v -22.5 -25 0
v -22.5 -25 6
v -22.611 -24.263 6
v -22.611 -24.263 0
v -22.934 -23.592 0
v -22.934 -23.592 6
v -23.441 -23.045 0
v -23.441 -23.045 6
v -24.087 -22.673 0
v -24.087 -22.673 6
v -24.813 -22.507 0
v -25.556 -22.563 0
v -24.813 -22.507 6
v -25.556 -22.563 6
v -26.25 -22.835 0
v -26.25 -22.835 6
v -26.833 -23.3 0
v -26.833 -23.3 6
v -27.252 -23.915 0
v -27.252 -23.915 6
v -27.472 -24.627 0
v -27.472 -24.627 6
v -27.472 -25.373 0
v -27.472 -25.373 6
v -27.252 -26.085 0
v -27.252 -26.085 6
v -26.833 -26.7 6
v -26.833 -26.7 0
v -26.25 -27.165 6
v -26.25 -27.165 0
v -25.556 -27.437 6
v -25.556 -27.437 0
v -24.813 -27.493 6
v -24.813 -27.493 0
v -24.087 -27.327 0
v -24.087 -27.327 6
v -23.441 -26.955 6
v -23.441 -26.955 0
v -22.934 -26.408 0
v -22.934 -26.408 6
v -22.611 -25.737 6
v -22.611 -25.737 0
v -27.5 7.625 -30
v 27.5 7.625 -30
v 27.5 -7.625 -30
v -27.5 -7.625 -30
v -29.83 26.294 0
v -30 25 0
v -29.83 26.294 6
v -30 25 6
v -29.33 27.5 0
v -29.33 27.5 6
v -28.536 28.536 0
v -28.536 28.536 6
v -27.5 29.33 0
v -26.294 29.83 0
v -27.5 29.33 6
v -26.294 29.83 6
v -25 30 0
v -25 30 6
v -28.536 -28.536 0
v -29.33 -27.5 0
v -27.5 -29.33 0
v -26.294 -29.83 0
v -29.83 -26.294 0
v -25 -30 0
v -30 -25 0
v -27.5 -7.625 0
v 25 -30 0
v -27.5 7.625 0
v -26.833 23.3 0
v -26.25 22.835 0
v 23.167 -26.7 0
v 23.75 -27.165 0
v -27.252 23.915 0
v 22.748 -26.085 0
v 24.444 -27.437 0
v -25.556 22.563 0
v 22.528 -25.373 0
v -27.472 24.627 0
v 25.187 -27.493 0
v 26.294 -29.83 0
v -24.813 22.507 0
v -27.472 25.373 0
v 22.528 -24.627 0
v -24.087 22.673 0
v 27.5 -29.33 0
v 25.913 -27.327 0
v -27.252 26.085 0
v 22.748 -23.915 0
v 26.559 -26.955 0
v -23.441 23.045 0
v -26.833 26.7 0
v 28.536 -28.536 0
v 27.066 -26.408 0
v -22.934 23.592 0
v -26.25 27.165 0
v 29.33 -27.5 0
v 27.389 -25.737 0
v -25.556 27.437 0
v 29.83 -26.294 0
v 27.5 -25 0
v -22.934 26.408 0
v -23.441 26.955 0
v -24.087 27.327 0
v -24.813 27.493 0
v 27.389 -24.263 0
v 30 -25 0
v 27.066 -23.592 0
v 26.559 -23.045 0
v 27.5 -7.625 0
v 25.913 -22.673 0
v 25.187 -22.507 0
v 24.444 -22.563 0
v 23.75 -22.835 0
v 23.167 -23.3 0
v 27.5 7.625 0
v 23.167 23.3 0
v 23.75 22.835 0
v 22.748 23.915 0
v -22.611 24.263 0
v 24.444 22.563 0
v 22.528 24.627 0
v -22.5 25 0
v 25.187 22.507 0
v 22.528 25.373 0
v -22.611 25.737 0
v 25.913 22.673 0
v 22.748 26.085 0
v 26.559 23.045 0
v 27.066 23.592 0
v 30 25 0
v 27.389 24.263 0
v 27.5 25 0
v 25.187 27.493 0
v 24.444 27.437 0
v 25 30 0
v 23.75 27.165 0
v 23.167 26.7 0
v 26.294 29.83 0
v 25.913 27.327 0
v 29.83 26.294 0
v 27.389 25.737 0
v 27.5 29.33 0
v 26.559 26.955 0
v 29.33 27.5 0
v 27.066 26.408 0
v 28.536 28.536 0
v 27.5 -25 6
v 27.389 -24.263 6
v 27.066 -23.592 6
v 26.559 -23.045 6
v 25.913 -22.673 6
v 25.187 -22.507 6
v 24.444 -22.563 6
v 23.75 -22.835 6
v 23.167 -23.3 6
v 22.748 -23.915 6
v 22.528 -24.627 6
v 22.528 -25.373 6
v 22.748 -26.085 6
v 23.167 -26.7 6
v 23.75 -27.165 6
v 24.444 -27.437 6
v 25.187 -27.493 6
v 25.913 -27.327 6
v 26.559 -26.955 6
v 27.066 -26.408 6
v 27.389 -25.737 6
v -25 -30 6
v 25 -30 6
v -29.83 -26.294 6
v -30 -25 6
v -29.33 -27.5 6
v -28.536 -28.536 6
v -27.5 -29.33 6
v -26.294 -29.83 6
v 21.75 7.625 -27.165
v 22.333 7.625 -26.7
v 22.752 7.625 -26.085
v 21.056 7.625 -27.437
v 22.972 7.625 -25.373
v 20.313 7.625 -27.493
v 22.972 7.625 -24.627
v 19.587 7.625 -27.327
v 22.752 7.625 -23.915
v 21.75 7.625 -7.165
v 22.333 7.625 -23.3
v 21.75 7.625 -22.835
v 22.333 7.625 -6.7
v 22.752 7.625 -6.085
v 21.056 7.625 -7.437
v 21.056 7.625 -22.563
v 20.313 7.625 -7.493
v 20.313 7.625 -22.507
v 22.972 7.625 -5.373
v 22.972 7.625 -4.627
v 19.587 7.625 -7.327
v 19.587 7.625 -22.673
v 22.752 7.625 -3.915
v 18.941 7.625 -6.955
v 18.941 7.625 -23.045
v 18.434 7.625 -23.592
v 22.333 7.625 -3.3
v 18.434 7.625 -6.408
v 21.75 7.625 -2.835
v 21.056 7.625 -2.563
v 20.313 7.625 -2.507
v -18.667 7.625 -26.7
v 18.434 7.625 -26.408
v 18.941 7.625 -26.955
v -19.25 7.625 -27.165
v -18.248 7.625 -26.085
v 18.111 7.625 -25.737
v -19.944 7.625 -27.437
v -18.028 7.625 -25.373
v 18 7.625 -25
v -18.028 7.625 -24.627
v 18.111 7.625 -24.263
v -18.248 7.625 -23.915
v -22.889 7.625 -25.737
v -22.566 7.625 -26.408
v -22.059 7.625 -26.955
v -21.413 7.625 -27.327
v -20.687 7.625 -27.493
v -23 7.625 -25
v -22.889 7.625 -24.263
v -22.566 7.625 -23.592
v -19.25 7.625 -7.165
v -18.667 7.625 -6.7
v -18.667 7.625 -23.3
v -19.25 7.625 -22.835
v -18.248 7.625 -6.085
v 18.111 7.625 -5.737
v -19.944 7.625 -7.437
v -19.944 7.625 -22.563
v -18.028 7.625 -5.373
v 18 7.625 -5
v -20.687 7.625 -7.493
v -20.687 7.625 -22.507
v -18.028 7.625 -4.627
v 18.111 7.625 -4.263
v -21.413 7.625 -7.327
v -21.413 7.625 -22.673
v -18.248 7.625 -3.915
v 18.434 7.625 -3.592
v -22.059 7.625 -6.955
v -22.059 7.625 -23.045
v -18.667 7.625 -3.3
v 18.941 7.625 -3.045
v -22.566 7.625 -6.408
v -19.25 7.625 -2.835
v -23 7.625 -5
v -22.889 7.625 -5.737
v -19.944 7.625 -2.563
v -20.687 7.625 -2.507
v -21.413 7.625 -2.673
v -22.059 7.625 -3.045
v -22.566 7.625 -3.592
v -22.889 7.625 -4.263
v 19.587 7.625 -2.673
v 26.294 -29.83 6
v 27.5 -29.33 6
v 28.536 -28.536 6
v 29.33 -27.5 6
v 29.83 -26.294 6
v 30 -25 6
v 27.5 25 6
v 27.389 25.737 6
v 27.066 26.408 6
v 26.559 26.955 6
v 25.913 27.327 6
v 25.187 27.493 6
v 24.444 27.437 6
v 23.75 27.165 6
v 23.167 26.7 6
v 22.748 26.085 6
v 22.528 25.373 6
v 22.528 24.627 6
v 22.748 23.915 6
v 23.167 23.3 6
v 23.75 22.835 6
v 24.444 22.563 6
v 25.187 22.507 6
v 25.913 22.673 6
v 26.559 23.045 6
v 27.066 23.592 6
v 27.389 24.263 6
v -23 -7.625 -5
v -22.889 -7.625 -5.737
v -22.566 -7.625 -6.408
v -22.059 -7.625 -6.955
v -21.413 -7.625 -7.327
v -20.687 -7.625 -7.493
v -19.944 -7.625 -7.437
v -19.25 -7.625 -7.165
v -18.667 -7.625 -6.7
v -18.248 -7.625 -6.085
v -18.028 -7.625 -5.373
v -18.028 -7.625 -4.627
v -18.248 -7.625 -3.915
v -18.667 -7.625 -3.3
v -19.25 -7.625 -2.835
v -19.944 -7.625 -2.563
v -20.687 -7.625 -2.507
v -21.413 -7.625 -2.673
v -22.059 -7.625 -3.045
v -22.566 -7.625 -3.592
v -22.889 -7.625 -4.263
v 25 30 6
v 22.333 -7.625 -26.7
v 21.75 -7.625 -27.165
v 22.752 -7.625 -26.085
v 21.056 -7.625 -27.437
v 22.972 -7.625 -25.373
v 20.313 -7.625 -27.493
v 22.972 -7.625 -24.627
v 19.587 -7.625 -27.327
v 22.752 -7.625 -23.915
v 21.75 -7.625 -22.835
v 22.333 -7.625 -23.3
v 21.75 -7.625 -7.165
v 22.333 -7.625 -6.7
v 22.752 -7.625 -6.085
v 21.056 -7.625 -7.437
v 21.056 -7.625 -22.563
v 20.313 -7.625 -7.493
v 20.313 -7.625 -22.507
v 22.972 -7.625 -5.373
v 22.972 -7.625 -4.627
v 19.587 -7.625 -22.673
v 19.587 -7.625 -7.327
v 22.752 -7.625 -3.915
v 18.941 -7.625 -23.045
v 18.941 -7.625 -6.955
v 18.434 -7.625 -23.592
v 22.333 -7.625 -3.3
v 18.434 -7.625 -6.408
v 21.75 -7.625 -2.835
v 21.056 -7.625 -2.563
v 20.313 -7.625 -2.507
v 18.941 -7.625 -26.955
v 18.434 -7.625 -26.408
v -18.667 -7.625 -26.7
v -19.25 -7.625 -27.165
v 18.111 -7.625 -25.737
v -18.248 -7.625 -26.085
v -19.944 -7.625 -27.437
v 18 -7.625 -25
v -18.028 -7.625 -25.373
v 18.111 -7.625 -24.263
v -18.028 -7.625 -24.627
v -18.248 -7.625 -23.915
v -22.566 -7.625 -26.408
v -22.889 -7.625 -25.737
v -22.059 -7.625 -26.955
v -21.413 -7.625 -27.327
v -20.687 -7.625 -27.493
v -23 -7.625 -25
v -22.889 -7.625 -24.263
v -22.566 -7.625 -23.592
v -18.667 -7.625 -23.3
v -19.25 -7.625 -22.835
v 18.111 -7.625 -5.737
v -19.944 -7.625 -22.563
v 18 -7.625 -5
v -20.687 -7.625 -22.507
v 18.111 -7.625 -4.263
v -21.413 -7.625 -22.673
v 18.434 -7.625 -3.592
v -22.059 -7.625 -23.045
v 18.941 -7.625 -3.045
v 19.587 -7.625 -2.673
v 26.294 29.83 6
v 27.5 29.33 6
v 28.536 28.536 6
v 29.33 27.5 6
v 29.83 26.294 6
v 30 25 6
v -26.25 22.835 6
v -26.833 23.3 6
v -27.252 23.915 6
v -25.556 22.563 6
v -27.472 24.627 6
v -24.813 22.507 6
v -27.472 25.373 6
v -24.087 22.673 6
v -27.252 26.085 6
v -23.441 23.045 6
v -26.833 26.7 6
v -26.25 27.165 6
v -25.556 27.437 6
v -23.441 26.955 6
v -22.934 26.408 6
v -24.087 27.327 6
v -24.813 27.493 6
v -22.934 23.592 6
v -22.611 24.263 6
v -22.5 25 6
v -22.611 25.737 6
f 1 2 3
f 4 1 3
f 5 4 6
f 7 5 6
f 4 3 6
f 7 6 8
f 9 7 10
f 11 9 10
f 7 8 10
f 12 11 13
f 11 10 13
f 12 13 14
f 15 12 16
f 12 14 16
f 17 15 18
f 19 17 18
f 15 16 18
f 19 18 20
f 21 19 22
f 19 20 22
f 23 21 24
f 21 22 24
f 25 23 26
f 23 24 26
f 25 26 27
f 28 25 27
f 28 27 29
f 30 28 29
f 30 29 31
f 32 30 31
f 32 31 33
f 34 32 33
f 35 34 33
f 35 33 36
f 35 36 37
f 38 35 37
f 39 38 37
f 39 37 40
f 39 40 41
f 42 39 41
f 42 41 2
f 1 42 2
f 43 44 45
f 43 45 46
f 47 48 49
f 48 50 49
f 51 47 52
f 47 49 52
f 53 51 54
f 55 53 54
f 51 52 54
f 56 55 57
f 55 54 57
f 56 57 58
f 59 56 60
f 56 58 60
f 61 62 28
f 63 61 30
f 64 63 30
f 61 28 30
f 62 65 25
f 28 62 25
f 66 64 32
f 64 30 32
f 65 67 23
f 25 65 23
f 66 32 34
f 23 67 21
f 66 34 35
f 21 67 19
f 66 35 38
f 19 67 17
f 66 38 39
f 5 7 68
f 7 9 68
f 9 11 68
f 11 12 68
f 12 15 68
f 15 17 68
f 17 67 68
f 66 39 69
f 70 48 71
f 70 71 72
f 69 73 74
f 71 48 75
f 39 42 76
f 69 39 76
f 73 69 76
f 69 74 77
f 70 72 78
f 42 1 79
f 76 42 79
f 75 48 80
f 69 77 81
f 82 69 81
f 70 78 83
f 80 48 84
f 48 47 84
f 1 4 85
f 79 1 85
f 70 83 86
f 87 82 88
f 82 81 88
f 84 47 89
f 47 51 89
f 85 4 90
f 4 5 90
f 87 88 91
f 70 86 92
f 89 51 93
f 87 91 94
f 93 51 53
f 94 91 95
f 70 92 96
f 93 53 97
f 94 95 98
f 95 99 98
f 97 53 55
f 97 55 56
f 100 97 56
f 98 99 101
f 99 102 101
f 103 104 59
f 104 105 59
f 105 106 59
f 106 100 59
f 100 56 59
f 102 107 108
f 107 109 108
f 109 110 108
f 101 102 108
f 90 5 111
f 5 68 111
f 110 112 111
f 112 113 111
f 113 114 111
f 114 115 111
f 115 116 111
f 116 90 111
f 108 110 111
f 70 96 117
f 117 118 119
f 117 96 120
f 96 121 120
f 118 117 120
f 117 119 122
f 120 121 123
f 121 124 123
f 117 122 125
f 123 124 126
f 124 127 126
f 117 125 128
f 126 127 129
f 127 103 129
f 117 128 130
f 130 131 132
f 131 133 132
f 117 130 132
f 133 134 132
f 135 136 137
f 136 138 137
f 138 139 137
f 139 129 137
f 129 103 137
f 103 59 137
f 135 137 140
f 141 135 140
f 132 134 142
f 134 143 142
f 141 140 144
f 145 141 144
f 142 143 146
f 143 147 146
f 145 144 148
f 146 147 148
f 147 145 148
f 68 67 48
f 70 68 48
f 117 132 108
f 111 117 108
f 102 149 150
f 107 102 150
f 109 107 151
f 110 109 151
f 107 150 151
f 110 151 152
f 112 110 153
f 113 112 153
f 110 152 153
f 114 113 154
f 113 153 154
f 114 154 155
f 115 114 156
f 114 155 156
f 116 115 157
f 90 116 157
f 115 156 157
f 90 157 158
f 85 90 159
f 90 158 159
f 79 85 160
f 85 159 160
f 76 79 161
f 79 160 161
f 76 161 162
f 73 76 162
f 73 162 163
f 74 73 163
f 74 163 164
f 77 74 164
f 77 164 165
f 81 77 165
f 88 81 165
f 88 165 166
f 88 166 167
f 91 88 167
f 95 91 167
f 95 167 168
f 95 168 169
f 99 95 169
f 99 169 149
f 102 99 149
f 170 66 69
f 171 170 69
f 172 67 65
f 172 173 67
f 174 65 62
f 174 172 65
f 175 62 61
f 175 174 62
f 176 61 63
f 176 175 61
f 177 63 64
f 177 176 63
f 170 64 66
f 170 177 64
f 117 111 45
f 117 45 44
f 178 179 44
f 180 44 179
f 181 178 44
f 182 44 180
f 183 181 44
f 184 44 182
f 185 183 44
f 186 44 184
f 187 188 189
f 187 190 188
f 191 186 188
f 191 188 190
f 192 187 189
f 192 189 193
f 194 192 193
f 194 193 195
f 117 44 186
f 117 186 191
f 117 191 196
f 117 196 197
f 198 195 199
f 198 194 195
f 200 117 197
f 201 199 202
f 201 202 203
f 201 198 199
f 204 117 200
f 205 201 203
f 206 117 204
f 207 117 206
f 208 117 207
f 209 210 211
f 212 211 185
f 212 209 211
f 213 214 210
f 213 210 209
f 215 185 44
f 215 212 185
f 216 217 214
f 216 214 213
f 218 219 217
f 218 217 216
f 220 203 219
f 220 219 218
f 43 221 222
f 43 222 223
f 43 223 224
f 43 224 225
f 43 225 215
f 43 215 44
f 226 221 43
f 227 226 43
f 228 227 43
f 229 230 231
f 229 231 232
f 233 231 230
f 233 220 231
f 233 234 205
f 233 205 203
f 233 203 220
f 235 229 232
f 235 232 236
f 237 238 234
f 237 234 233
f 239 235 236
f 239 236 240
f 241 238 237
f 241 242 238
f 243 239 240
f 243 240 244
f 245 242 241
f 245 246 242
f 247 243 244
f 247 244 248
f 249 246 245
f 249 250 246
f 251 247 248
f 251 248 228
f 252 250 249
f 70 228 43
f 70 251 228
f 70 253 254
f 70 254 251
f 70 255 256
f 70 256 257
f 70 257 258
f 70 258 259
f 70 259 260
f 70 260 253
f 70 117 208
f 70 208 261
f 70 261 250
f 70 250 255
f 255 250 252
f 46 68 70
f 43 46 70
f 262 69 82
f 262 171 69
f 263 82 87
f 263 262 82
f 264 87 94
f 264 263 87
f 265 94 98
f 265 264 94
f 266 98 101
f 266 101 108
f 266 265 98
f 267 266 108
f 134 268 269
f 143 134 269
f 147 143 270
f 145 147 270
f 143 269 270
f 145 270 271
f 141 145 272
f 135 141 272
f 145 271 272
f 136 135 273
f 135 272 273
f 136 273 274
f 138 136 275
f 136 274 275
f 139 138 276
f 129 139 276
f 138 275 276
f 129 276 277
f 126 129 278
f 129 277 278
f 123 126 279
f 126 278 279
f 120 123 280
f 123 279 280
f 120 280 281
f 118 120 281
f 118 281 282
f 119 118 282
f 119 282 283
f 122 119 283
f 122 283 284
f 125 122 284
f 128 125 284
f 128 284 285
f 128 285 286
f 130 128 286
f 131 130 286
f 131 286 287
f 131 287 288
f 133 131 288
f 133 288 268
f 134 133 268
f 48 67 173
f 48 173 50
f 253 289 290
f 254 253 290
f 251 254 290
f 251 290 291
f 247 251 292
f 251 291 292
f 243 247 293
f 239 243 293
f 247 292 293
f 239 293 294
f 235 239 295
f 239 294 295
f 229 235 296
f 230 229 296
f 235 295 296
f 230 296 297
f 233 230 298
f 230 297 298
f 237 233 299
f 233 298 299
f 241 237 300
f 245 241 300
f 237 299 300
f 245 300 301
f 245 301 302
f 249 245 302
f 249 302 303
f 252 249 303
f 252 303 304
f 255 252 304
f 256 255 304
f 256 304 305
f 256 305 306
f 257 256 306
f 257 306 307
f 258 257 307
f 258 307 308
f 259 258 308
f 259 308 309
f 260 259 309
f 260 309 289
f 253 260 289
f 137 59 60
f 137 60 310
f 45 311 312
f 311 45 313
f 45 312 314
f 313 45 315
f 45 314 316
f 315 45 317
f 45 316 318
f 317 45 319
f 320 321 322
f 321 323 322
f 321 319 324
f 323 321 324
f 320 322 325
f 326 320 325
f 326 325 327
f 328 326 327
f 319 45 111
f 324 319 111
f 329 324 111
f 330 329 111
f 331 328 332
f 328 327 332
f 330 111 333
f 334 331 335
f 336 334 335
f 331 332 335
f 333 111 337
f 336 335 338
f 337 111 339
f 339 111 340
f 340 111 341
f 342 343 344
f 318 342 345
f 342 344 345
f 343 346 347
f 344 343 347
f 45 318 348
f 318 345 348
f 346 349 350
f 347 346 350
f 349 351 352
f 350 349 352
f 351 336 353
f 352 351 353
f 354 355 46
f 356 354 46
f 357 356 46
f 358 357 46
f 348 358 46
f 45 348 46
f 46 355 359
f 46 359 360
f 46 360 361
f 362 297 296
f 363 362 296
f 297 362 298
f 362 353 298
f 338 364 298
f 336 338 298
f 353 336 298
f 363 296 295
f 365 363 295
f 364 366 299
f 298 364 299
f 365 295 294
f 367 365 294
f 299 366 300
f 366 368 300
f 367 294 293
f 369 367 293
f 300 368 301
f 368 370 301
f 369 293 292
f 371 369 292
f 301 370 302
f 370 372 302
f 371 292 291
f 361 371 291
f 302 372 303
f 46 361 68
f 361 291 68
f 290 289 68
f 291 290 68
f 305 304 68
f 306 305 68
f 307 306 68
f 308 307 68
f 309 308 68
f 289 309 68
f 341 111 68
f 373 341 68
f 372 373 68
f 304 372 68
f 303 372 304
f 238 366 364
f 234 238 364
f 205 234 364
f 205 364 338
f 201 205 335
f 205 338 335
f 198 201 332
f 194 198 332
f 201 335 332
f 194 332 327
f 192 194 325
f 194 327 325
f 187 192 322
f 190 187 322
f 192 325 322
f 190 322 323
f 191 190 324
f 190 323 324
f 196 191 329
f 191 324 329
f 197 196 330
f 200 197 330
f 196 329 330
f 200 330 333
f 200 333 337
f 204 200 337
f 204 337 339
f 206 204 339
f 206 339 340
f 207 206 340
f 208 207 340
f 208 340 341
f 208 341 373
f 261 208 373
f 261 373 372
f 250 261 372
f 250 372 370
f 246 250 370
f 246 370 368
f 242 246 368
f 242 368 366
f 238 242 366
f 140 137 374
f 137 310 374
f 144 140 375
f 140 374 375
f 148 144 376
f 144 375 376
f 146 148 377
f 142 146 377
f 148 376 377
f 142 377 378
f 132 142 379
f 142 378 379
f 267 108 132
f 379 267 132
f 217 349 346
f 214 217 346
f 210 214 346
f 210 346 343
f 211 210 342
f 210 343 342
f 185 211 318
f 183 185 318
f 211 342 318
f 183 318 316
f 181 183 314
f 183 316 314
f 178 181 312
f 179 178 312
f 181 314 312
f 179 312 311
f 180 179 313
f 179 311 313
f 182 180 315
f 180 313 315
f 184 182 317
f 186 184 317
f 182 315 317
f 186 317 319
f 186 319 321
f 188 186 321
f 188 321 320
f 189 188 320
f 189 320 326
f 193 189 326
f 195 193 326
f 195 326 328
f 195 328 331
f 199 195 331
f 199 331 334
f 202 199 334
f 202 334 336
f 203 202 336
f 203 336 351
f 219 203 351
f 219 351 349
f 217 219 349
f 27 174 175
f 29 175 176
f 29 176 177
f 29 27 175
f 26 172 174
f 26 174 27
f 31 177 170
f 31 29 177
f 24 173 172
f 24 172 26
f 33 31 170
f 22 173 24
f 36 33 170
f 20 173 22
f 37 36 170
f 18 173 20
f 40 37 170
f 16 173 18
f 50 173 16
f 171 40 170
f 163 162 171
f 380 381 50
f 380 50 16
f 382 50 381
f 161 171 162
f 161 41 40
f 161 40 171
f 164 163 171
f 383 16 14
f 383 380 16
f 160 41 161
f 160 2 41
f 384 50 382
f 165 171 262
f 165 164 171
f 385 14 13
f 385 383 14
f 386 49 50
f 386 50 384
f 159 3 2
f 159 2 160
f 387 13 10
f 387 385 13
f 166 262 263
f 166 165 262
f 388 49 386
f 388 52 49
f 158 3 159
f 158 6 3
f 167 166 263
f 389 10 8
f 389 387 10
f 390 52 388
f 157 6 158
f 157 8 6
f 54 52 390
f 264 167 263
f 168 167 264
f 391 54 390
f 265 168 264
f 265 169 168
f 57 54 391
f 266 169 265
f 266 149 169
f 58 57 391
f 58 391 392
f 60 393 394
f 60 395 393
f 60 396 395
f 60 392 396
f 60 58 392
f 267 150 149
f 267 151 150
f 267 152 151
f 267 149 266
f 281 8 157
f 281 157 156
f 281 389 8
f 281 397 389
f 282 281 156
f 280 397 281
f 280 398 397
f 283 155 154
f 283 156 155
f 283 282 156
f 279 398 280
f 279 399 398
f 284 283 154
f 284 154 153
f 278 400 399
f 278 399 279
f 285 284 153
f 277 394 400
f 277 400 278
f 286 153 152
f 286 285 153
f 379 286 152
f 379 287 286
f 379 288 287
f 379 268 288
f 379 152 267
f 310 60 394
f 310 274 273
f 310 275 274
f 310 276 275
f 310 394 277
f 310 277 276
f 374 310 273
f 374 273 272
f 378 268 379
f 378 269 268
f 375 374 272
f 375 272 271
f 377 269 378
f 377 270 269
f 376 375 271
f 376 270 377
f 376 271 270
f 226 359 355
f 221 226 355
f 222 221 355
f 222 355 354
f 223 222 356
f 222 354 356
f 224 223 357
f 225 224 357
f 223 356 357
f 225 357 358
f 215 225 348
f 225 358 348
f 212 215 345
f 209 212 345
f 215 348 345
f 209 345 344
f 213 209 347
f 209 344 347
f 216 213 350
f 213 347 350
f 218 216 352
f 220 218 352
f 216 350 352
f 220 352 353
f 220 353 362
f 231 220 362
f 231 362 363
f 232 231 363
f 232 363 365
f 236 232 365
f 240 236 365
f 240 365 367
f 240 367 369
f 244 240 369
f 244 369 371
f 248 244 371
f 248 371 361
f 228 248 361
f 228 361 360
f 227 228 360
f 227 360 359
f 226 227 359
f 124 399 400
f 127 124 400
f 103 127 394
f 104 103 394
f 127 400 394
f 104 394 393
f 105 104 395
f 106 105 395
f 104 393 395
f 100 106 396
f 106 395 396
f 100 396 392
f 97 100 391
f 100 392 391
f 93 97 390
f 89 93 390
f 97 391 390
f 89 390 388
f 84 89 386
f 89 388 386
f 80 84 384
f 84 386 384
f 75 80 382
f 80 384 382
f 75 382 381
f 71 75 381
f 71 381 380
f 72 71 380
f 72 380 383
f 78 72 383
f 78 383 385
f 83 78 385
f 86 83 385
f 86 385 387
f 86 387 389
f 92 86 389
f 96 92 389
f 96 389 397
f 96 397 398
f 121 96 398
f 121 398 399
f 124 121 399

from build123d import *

# Parameters (mm, degrees)
SKETCH1_W             = 60
SKETCH1_H             = 60
BOSS_EXTRUDE1_DEPTH   = 6
SKETCH2_W             = 55
SKETCH2_H             = 15.25
BOSS_EXTRUDE2_DEPTH   = 30
F_5_0MM_DOWEL_HOLE1_D = 5
FILLET1_R             = 5
F_5_0MM_DOWEL_HOLE2_D = 5


with BuildPart() as part:
    # Sketch1 → Boss-Extrude1 (new body)
    with BuildSketch(Plane.XY):
        Rectangle(SKETCH1_W, SKETCH1_H)
    extrude(amount=BOSS_EXTRUDE1_DEPTH)

    # Sketch2 → Boss-Extrude2 (add)
    with BuildSketch(Plane(origin=(0, 0, 0), x_dir=(-1, 0, 0), z_dir=(0, 0, -1))):
        Rectangle(SKETCH2_W, SKETCH2_H)
    extrude(amount=BOSS_EXTRUDE2_DEPTH)

    # Ø5.0mm Dowel Hole1 (through all)
    with Locations(Plane(origin=(0, 0, 0), x_dir=(-1, 0, 0), z_dir=(0, 0, -1))):
        with Locations((25, 25), (-25, 25), (25, -25), (-25, -25)):
            Hole(F_5_0MM_DOWEL_HOLE1_D / 2)

    # Fillet1
    fillet1_edges = [part.edges().sort_by_distance(p)[0] for p in [
        (30, -30, 3),
        (-30, -30, 3),
        (-30, 30, 3),
        (30, 30, 3),
    ]]
    fillet(fillet1_edges, radius=FILLET1_R)

    # Ø5.0mm Dowel Hole2 (through all)
    with Locations(Plane(origin=(0, 7.625, 0), x_dir=(1, 0, 0), z_dir=(0, 1, 0))):
        with Locations((20.5, 25), (20.5, 5), (-20.5, 5), (-20.5, 25)):
            Hole(F_5_0MM_DOWEL_HOLE2_D / 2)


solid = part.part
